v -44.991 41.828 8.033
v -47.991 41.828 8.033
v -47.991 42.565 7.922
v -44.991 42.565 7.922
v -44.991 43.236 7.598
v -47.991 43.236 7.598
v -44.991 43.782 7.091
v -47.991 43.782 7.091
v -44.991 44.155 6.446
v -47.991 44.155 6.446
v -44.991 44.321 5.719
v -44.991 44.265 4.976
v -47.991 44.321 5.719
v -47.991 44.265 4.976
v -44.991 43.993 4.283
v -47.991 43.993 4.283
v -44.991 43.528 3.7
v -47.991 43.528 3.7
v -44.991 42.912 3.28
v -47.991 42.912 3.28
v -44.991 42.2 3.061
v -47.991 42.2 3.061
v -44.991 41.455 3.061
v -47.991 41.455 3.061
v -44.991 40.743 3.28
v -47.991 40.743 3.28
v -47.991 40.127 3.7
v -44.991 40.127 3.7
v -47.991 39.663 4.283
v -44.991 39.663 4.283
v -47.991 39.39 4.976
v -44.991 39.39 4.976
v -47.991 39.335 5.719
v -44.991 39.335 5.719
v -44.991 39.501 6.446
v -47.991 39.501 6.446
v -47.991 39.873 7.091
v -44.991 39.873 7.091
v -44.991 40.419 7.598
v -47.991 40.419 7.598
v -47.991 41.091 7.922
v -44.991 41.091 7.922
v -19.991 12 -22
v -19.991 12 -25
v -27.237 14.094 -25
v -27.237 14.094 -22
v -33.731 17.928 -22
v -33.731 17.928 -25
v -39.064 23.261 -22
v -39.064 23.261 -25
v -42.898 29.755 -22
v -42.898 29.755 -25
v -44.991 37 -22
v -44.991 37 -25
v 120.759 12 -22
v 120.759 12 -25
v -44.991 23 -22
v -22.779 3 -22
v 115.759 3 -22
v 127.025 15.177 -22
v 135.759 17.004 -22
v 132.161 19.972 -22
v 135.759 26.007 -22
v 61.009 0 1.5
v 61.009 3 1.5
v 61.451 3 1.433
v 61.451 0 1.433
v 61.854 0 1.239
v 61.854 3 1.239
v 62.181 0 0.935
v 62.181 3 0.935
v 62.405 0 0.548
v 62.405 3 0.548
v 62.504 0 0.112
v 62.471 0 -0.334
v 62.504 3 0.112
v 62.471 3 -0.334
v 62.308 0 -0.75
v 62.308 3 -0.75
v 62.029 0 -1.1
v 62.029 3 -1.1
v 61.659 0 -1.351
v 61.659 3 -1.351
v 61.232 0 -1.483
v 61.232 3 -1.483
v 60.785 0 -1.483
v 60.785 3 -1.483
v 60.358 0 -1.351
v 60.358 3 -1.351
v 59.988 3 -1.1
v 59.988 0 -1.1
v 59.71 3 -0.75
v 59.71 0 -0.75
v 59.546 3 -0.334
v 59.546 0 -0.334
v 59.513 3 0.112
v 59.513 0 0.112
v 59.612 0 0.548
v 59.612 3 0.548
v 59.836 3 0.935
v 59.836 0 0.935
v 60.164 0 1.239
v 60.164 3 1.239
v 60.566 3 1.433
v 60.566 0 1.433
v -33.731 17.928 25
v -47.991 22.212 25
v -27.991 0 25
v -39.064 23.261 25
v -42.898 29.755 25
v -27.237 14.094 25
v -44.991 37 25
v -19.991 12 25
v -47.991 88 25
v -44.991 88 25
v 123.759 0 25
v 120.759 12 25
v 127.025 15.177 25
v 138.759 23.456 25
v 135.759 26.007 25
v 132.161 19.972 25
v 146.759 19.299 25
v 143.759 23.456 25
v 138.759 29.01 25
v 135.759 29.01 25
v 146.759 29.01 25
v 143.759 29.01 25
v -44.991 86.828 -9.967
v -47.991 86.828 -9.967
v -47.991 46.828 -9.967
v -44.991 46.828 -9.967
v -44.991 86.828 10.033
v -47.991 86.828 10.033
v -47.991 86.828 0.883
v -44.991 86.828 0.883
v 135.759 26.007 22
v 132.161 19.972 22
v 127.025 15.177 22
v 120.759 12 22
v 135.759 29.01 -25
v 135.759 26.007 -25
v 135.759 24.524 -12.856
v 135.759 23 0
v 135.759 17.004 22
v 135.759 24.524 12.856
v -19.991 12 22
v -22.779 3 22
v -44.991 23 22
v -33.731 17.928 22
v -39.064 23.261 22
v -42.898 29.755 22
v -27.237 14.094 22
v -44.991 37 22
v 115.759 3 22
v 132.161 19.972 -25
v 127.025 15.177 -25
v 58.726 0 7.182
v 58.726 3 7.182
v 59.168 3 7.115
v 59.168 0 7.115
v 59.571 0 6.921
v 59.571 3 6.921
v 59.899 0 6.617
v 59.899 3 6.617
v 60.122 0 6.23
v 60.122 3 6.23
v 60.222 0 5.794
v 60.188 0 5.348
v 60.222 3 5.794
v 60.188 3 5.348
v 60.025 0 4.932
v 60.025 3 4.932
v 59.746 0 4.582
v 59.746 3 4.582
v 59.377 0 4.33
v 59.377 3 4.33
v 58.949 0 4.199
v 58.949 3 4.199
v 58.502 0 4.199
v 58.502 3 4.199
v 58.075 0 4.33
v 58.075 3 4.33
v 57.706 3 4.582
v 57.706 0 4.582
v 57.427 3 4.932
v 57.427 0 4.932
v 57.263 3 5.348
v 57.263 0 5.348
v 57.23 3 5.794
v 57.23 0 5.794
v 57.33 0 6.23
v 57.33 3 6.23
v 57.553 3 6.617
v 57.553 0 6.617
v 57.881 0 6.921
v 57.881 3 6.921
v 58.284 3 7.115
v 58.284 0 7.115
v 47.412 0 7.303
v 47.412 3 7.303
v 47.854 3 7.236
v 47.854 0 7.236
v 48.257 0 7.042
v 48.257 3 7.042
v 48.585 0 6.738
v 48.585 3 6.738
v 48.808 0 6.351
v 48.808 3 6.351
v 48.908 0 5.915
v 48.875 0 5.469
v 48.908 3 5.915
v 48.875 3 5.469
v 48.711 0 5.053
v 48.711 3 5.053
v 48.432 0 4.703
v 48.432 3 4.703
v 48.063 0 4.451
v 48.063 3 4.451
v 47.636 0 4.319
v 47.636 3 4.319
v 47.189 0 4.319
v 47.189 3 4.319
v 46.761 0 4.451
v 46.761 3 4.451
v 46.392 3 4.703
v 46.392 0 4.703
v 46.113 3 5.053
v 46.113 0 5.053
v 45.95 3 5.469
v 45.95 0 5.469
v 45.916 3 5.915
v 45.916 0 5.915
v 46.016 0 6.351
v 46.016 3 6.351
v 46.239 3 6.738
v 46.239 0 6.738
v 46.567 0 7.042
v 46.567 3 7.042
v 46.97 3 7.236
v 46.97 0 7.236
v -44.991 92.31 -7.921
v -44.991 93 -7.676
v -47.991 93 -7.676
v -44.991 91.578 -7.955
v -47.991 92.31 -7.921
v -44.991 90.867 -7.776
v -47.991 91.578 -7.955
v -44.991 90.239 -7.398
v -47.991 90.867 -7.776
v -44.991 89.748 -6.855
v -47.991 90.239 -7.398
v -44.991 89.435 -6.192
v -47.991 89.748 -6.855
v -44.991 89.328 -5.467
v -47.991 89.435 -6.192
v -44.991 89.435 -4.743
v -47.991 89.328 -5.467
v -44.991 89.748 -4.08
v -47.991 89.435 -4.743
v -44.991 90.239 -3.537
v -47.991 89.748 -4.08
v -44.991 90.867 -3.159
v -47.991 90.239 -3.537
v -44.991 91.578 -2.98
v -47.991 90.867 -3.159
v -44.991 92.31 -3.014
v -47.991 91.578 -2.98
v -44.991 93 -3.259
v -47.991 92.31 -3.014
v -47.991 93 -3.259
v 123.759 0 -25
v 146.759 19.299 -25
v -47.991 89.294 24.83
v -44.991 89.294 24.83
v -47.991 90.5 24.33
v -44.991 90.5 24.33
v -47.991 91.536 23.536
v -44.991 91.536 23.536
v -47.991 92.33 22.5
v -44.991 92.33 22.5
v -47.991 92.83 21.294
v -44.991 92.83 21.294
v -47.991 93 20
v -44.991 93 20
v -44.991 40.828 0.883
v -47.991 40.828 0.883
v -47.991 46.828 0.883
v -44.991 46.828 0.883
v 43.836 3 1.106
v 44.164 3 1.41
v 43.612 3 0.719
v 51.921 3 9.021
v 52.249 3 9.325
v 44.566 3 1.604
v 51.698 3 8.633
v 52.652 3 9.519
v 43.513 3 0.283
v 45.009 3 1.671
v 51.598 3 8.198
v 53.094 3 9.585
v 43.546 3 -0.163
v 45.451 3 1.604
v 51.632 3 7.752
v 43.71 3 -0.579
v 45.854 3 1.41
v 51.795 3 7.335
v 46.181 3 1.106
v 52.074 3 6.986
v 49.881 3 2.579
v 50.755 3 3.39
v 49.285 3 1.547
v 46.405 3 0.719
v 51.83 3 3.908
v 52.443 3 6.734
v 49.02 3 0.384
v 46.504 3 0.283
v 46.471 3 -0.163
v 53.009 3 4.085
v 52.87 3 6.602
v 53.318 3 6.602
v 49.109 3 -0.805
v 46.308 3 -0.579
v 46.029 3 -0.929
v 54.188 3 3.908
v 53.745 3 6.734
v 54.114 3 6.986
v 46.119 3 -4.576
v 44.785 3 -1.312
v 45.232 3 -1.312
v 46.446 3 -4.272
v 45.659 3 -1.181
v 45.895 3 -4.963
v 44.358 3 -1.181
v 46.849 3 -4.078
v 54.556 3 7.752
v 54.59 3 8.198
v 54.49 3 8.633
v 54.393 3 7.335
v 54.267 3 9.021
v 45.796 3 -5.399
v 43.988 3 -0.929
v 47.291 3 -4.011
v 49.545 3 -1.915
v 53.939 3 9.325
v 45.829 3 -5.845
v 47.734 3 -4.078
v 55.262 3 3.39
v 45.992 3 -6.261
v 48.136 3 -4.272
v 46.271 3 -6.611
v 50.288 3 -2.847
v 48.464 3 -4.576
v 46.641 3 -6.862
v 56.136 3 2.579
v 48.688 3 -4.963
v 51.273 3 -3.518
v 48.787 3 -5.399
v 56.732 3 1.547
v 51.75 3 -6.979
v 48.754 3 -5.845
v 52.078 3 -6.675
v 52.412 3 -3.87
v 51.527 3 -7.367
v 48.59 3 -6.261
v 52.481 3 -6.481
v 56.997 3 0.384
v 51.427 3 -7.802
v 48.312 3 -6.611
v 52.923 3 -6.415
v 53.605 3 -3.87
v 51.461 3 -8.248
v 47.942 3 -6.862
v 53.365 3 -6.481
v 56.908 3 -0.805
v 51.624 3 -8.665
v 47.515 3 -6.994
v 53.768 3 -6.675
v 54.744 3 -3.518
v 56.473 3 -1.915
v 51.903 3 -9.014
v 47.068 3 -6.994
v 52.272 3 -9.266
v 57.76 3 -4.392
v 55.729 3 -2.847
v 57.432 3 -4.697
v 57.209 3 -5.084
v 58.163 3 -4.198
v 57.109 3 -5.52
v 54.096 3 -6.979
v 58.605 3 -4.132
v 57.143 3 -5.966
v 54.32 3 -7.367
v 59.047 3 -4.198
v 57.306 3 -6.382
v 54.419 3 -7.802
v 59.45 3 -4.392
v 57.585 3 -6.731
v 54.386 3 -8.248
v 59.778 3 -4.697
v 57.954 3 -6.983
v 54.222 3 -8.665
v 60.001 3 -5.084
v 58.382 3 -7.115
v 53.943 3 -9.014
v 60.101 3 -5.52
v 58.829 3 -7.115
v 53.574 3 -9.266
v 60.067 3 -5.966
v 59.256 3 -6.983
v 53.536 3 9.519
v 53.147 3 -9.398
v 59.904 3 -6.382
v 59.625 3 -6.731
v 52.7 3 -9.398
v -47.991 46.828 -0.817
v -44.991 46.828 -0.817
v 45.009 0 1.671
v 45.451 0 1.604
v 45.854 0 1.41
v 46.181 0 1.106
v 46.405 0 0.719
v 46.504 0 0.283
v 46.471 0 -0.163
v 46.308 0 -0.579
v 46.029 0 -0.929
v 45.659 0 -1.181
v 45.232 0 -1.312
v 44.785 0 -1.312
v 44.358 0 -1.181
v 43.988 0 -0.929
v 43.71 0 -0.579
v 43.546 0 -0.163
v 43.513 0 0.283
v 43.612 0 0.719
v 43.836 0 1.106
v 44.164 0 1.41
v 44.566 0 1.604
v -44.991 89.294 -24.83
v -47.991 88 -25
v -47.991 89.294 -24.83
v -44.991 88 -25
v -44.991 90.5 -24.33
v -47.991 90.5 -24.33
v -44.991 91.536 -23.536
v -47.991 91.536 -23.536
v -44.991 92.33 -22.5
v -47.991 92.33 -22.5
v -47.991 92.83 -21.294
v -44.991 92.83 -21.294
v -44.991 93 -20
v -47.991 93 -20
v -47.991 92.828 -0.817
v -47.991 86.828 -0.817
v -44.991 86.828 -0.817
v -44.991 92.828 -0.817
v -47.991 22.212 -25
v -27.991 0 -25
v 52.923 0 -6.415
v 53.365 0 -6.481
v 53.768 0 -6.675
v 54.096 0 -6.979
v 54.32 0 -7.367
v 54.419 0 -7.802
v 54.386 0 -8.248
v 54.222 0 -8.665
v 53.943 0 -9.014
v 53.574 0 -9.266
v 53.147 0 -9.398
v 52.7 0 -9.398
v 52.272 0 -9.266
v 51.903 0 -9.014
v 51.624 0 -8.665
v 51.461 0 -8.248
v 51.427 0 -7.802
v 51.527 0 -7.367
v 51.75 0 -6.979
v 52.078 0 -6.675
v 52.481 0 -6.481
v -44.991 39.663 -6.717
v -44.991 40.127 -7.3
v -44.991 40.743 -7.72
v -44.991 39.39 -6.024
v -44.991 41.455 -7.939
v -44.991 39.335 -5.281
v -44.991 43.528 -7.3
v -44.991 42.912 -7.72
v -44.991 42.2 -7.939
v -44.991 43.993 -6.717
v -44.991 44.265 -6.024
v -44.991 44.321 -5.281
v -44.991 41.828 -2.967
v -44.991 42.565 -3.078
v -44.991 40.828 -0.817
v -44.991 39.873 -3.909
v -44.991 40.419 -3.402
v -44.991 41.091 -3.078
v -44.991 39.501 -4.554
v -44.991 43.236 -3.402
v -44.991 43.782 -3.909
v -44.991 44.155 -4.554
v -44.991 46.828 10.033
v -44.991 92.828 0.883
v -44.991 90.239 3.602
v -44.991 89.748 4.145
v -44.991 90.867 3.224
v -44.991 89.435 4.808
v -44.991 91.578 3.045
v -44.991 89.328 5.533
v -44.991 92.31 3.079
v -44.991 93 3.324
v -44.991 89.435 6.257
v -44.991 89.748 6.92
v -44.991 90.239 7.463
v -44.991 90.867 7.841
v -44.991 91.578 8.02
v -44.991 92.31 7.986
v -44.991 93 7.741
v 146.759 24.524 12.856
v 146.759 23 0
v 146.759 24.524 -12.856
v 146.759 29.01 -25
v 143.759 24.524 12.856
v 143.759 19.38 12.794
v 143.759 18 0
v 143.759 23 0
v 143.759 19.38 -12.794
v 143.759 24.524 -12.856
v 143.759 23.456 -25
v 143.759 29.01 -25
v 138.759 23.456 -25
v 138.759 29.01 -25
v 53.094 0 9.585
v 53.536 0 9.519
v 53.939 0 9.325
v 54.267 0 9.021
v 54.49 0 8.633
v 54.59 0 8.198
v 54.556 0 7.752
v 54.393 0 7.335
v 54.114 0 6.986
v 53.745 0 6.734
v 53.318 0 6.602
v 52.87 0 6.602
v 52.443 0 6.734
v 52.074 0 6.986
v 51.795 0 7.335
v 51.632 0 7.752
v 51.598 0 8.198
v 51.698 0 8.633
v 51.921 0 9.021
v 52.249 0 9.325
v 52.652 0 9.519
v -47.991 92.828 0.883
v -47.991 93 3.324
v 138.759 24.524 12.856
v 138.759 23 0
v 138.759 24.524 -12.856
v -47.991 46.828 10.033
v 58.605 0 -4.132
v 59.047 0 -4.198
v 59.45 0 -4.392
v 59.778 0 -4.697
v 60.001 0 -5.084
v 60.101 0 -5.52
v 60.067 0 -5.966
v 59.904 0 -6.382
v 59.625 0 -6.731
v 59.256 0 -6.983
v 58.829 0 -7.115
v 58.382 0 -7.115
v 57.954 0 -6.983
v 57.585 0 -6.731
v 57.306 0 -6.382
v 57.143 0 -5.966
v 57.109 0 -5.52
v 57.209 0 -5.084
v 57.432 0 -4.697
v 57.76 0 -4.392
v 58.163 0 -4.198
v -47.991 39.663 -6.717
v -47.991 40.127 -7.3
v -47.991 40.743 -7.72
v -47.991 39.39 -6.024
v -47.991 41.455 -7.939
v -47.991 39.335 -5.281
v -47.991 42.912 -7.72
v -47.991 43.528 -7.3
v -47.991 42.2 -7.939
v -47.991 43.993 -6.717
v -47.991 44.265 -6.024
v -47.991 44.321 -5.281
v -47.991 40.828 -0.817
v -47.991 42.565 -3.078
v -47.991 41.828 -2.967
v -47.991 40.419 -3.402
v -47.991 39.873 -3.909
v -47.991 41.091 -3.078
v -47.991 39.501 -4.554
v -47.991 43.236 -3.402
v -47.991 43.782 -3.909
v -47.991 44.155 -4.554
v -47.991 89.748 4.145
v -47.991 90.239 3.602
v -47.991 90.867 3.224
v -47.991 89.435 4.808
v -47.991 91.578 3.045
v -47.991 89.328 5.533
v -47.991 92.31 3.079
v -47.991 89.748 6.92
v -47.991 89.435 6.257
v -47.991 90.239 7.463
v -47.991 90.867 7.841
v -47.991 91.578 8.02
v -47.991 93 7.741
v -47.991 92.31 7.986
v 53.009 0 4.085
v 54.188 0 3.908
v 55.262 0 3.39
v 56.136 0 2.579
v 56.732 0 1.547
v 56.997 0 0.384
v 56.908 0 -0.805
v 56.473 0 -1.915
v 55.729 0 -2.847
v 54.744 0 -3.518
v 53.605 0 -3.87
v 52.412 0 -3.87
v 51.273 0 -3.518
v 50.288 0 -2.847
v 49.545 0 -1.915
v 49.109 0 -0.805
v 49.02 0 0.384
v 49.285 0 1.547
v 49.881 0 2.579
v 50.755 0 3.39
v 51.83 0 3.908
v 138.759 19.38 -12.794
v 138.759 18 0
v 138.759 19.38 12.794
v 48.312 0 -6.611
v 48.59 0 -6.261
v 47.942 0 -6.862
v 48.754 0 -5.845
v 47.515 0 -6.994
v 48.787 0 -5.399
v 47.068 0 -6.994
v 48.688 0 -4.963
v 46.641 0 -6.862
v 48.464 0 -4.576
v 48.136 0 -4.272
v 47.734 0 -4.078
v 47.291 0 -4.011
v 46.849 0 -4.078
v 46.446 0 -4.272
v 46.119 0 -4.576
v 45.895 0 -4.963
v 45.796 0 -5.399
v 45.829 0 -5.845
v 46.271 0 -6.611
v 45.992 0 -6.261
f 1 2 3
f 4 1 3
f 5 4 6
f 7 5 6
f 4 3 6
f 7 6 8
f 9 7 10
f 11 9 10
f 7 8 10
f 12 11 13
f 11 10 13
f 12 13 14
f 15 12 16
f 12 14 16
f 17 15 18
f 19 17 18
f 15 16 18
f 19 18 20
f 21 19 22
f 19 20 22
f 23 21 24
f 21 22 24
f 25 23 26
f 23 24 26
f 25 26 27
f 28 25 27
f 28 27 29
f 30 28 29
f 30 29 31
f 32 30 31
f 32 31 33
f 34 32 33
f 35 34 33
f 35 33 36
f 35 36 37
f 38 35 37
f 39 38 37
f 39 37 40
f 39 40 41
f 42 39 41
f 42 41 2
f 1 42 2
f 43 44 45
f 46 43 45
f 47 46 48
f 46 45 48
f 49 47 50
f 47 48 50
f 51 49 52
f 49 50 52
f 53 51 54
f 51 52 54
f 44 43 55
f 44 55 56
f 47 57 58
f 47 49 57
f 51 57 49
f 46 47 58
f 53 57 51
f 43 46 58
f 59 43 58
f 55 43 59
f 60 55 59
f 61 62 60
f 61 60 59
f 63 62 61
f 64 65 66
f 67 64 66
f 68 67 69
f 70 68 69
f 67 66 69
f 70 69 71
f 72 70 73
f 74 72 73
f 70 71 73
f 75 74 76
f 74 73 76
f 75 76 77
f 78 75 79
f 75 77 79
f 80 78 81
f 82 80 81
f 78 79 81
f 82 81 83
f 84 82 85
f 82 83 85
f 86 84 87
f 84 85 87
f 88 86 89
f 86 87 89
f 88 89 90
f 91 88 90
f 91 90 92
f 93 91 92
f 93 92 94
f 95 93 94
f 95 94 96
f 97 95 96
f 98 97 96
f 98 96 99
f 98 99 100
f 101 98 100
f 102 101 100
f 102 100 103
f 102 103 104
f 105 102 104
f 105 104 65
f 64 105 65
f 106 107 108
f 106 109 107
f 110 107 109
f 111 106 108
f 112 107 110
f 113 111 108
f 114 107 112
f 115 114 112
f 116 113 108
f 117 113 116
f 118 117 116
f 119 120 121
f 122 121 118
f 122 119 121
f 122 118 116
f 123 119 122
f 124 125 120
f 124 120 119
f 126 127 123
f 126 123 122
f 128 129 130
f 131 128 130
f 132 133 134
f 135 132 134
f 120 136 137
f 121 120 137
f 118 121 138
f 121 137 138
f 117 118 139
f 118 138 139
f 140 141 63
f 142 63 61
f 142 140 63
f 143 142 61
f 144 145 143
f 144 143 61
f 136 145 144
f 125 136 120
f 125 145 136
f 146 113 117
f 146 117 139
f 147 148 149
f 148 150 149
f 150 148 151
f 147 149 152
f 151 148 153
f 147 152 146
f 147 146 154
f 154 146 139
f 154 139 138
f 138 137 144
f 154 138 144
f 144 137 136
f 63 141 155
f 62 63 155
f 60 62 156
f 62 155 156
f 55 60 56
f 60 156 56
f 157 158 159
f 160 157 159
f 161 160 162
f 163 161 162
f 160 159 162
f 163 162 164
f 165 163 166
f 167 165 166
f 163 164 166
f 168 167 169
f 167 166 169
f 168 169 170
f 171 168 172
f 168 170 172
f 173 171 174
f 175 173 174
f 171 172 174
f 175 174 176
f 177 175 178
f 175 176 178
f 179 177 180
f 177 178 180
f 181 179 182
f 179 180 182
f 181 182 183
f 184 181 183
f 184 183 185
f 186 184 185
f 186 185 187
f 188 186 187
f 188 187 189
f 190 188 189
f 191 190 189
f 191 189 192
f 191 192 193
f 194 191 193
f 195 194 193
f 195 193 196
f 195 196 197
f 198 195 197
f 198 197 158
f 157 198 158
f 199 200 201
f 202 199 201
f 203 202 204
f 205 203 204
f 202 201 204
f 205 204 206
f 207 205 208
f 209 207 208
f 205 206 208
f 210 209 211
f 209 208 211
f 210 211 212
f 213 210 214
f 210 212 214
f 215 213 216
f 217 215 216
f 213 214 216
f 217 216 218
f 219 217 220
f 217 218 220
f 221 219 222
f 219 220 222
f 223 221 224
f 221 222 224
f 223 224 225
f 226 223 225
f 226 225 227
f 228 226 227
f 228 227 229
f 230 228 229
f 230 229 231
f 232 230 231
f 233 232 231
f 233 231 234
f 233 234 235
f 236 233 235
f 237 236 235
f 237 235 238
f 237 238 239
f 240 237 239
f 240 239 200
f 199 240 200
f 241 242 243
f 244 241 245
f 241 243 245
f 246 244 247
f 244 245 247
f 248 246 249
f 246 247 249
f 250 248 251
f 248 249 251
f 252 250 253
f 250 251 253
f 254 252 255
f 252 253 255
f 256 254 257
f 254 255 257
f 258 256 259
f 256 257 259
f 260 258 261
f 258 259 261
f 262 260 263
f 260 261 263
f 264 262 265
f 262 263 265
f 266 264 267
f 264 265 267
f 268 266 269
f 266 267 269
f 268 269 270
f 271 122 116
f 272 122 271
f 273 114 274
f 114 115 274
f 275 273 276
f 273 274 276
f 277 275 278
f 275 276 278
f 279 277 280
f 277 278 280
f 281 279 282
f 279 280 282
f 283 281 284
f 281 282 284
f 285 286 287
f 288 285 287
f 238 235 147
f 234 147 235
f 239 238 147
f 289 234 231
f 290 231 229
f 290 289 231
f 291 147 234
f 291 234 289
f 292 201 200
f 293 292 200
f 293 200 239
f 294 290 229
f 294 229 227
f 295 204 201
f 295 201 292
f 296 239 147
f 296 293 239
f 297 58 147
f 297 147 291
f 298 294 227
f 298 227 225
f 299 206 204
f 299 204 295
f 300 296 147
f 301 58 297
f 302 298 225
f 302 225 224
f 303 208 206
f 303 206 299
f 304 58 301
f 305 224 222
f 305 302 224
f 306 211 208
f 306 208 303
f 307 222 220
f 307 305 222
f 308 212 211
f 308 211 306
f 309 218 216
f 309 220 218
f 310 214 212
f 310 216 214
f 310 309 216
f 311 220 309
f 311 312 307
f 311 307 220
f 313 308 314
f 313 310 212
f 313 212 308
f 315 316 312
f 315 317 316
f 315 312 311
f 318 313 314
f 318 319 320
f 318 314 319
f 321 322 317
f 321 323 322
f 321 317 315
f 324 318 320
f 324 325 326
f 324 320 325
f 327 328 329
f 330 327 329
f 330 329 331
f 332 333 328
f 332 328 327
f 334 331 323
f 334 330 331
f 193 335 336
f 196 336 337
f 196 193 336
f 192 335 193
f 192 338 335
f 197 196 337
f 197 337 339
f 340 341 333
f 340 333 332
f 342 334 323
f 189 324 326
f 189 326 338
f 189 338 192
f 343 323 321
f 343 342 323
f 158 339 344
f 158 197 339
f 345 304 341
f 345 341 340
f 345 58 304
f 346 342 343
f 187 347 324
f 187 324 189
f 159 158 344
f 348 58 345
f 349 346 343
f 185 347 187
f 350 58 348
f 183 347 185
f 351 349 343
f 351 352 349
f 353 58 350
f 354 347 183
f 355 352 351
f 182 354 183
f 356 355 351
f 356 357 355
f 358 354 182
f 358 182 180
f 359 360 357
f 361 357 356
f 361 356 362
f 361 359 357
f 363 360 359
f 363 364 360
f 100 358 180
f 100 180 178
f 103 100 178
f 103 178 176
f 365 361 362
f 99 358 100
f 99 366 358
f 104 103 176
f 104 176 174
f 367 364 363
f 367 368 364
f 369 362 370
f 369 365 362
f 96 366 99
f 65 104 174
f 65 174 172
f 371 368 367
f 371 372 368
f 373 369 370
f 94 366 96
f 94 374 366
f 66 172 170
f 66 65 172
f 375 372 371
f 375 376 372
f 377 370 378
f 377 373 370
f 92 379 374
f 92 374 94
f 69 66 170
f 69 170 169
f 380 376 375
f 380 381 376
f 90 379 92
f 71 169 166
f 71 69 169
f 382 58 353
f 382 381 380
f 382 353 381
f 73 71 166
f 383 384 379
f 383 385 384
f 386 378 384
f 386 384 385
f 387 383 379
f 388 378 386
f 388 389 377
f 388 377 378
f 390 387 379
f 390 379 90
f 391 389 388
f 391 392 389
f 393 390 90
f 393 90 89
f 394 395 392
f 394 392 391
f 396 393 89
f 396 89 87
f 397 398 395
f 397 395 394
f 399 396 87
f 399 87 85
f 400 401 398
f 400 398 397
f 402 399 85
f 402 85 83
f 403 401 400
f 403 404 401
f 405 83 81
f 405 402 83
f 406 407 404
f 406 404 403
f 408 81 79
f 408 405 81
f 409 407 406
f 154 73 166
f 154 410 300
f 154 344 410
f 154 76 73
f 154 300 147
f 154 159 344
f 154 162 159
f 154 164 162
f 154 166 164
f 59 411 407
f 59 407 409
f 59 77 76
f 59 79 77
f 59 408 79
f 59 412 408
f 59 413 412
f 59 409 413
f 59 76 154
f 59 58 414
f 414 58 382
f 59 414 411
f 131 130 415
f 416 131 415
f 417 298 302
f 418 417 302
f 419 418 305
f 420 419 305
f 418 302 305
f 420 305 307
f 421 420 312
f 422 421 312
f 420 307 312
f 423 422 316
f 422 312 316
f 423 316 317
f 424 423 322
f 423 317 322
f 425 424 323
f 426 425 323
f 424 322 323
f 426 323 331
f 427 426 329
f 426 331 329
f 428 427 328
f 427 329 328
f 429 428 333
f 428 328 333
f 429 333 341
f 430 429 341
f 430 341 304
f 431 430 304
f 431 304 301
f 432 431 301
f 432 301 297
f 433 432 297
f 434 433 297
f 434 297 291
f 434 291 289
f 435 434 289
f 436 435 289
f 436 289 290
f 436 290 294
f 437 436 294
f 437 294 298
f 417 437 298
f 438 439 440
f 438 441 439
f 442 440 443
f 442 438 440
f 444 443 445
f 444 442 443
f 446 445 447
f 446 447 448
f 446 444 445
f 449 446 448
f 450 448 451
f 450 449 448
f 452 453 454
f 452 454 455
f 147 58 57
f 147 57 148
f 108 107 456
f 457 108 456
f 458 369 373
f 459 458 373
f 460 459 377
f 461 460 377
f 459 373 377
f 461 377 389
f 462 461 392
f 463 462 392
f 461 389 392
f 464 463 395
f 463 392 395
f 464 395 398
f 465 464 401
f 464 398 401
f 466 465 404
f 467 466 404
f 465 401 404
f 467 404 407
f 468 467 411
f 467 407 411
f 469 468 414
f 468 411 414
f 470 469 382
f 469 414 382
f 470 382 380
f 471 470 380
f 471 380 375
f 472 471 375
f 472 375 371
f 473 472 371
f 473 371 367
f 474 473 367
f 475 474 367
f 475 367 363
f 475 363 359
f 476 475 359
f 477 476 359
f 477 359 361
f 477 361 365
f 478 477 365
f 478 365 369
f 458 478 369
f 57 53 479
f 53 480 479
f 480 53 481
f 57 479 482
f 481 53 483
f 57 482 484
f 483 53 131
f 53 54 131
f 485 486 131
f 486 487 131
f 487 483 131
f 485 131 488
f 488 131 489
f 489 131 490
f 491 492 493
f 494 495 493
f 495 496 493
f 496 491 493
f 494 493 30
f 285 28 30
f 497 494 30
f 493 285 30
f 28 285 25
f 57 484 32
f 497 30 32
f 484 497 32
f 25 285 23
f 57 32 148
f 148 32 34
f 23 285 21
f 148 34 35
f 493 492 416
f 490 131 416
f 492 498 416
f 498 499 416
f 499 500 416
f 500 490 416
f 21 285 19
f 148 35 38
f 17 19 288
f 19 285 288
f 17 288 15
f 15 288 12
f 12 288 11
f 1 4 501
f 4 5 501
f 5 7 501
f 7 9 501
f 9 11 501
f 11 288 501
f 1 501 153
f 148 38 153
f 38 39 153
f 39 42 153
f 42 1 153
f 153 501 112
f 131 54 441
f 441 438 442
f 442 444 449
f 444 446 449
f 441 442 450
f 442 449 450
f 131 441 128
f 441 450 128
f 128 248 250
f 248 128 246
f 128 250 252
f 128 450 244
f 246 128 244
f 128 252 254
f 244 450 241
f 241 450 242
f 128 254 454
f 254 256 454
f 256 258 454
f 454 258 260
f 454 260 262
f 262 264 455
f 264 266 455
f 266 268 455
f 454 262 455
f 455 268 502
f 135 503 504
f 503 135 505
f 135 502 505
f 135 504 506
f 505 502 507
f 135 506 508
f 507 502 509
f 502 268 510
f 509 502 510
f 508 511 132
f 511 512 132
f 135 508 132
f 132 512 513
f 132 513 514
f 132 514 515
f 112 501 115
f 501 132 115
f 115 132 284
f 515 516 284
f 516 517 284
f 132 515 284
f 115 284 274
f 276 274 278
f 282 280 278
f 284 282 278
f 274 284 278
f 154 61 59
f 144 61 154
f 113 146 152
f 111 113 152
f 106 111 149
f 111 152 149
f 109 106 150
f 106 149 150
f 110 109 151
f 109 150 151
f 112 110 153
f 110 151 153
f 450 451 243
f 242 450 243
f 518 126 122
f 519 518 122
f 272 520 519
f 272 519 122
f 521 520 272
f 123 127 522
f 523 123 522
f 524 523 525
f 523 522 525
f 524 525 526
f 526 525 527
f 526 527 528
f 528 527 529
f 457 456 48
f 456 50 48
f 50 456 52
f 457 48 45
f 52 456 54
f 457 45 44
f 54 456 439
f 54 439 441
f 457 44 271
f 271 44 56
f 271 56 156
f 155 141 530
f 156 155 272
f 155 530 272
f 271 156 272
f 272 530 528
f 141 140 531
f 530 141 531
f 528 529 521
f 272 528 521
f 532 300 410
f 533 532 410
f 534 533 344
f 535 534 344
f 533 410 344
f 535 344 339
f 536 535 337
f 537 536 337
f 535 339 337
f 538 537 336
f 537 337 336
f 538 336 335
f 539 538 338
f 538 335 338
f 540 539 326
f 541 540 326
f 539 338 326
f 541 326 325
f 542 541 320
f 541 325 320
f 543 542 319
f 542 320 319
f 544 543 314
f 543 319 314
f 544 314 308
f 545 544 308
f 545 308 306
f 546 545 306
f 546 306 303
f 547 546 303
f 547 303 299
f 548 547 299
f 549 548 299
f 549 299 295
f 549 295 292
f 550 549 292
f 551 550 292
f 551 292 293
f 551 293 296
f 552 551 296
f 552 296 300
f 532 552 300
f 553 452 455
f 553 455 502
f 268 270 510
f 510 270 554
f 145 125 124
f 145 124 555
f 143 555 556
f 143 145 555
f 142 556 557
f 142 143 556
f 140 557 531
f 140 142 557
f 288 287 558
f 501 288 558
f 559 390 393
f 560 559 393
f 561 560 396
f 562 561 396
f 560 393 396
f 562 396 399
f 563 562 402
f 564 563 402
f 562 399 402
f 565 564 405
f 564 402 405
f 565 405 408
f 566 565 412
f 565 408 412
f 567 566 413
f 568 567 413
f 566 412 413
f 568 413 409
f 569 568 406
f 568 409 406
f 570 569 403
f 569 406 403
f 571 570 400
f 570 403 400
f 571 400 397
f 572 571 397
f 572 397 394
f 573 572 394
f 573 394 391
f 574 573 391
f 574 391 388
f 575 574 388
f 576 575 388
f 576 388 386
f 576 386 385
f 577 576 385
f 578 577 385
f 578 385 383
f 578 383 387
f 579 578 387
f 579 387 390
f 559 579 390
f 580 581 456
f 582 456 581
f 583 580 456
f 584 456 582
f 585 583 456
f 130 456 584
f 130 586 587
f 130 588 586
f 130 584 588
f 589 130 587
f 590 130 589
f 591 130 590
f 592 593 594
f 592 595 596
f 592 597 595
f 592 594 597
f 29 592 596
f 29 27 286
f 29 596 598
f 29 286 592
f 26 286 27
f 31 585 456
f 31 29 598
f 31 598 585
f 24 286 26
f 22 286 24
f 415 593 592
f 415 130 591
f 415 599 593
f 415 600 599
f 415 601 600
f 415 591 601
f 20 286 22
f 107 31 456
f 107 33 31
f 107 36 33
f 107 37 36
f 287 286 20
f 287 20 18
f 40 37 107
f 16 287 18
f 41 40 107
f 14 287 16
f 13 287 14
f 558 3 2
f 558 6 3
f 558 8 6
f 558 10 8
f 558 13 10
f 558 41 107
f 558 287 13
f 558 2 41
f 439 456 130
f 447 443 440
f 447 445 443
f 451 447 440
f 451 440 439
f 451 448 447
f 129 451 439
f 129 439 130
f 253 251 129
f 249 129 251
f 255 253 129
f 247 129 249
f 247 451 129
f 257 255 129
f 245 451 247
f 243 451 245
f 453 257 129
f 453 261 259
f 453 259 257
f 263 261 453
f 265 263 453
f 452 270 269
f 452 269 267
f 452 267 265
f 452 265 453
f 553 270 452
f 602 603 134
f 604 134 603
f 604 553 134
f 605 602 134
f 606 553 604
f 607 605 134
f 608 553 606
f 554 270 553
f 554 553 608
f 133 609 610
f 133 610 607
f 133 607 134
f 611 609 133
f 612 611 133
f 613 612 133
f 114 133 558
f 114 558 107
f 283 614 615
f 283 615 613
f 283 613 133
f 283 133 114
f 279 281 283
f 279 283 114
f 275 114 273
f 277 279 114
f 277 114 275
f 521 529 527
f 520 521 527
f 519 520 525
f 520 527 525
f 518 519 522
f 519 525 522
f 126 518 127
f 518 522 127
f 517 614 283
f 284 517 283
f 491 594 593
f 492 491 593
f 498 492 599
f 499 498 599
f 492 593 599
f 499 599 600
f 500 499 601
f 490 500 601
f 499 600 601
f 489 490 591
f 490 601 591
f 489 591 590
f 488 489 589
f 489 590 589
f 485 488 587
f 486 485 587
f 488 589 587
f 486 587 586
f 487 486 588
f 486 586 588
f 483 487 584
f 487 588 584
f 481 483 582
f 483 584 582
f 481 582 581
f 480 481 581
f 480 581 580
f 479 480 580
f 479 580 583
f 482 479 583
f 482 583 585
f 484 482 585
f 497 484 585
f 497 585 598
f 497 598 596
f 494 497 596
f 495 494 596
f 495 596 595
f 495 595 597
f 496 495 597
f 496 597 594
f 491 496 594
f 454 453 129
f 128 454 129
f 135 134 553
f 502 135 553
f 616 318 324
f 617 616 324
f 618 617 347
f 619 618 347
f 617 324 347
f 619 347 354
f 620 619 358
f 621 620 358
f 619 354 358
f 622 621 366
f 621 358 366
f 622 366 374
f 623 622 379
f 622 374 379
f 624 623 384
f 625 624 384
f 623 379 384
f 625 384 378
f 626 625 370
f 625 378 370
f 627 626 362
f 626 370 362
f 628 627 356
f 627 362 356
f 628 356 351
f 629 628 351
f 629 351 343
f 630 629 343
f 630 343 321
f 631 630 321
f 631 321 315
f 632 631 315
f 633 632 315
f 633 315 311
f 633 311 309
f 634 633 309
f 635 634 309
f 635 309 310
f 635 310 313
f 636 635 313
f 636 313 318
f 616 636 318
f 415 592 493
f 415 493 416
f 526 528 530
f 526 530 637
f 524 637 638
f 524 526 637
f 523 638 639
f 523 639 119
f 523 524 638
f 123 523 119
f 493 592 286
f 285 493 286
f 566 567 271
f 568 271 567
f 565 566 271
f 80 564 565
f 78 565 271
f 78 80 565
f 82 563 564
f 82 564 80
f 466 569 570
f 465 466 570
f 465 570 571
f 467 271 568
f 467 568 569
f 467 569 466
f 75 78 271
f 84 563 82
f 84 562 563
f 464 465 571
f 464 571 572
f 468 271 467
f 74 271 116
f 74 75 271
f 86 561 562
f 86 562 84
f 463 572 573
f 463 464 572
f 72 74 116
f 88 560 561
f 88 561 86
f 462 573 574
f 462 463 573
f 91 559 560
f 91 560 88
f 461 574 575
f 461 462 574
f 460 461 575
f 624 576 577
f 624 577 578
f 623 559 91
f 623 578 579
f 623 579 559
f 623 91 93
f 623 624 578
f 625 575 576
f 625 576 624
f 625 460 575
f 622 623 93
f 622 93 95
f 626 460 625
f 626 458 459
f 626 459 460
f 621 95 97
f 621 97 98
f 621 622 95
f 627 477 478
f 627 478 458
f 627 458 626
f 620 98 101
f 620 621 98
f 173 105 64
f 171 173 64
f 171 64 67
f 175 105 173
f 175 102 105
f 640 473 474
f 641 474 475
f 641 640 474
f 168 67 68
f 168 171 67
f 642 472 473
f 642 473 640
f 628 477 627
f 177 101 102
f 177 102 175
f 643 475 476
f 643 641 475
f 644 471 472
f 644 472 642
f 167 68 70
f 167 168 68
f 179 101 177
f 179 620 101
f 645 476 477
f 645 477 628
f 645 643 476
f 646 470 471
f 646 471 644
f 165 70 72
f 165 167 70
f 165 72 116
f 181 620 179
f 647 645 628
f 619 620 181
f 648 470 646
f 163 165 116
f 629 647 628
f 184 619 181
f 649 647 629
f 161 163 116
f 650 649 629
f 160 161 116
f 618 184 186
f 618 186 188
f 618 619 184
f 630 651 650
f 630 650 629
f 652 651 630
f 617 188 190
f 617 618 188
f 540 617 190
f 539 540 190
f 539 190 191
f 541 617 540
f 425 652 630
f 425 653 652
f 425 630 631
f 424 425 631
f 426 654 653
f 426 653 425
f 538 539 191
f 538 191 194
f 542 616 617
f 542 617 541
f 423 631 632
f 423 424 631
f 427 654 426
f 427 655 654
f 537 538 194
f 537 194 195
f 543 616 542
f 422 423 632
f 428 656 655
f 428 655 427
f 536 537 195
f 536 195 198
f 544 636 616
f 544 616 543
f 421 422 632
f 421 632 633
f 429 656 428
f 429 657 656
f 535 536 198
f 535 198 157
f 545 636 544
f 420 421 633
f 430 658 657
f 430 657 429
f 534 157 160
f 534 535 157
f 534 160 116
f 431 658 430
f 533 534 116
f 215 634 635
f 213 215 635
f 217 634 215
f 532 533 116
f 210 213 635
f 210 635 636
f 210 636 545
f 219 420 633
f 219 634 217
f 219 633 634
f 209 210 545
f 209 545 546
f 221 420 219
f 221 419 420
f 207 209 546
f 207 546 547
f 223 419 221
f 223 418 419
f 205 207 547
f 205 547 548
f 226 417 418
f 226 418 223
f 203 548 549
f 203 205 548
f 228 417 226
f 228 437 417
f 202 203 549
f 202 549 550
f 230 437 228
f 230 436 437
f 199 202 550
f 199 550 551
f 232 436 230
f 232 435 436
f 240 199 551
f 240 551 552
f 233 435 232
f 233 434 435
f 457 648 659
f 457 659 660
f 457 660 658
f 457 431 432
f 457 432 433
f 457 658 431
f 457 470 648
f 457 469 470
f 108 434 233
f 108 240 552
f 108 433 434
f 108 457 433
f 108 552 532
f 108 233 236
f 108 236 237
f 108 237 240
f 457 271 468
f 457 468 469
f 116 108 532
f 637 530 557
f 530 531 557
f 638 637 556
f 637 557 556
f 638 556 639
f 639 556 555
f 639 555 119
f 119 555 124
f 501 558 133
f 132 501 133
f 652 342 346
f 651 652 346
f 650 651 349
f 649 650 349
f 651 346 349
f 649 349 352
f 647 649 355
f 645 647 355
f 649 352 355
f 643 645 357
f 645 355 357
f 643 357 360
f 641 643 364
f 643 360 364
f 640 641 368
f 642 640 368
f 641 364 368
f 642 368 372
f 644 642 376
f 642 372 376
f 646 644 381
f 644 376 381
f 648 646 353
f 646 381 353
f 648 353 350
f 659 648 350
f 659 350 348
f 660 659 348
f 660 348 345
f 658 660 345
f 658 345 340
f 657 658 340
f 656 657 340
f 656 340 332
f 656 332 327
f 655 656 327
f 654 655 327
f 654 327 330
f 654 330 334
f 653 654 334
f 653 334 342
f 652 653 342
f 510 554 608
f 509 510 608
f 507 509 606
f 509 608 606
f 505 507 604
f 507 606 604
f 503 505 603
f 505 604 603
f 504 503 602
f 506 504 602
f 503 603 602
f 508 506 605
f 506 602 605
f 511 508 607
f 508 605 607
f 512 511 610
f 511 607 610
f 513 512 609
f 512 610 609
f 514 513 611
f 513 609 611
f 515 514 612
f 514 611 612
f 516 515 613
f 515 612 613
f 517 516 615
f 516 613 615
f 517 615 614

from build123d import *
from OCP.BRepFilletAPI import BRepFilletAPI_MakeChamfer

# Parameters (mm, degrees)
SKETCH1_W           = 194.75
SKETCH1_H           = 50
BOSS_EXTRUDE1_DEPTH = 3
BOSS_EXTRUDE2_START = -3
BOSS_EXTRUDE2_DEPTH = 5
BOSS_EXTRUDE3_DEPTH = 3
BOSS_EXTRUDE4_START = -3
BOSS_EXTRUDE4_DEPTH = 3
SKETCH6_W           = 50
SKETCH6_H           = 90
BOSS_EXTRUDE5_DEPTH = 3
BOSS_EXTRUDE6_REACH = 216.574
SKETCH7_W           = 3
SKETCH7_H           = 9
RIB1_START          = -3
RIB1_DEPTH          = 3
LPATTERN1_COUNT     = 2
LPATTERN1_PITCH     = 47
RIB2_START          = -3
RIB2_DEPTH          = 3
LPATTERN2_COUNT     = 2
LPATTERN2_PITCH     = 47
CUT_EXTRUDE1_REACH  = 175.963
SKETCH10_R          = 4
SKETCH10_R_2        = 1.5
FILLET1_R           = 5
CHAMFER1_SIZE       = 20
CHAMFER1_SIZE2      = 22.212250297
CHAMFER2_SIZE       = 20
CHAMFER2_SIZE2      = 14.004150764
CHAMFER3_SIZE       = 23
CHAMFER3_SIZE2      = 19.299291517
CUT_EXTRUDE2_REACH  = 219.259
SKETCH11_W          = 1.7
SKETCH11_H          = 6
SKETCH11_R          = 2.5


# Read off the part's stored shape, not the designer's step: Rib1, Rib2
with BuildPart() as part:
    # Sketch1 → Boss-Extrude1 (new body)
    with BuildSketch(Plane(origin=(0, 0, 0), x_dir=(1, 0, 0), z_dir=(0, 1, 0))):
        with Locations((49.3836315, 0)):
            Rectangle(SKETCH1_W, SKETCH1_H)
    extrude(amount=BOSS_EXTRUDE1_DEPTH)

    # Sketch2 → Boss-Extrude2 (add)
    with BuildSketch(Plane(origin=(146.7586315, 0, 0), x_dir=(0, 0, -1), z_dir=(1, 0, 0)).offset(BOSS_EXTRUDE2_START)):
        with BuildLine():
            Line((25, 3), (25, 23.456439427))
            ThreePointArc((25, 23.456439427), (0, 18), (-25, 23.456439427))
            Line((-25, 23.456439427), (-25, 3))
            Line((-25, 3), (25, 3))
        make_face()
    extrude(amount=-BOSS_EXTRUDE2_DEPTH)

    # Sketch3 → Boss-Extrude3 (add)
    with BuildSketch(Plane(origin=(143.7586315, 0, 0), x_dir=(0, 0, -1), z_dir=(1, 0, 0))):
        with BuildLine():
            Line((-25, 3), (25, 3))
            Line((25, 3), (25, 29.010205144))
            ThreePointArc((25, 29.010205144), (0, 23), (-25, 29.010205144))
            Line((-25, 29.010205144), (-25, 3))
        make_face()
    extrude(amount=BOSS_EXTRUDE3_DEPTH)

    # Sketch4 → Boss-Extrude4 (add)
    with BuildSketch(Plane(origin=(138.7586315, 0, 0), x_dir=(0, 0, -1), z_dir=(1, 0, 0)).offset(BOSS_EXTRUDE4_START)):
        with BuildLine():
            Line((-25, 0), (-25, 29.010205144))
            ThreePointArc((-25, 29.010205144), (0, 23), (25, 29.010205144))
            Line((25, 29.010205144), (25, 0))
            Line((25, 0), (-25, 0))
        make_face()
    extrude(amount=BOSS_EXTRUDE4_DEPTH)

    # Sketch6 → Boss-Extrude5 (add)
    with BuildSketch(Plane.ZY.offset(47.9913685)):
        with Locations((0, 48)):
            Rectangle(SKETCH6_W, SKETCH6_H)
    extrude(amount=-BOSS_EXTRUDE5_DEPTH)

    # Sketch7 → Boss-Extrude6 (add, up to next)
    with BuildSketch(Plane(origin=(-44.9913685, 0, 0), x_dir=(0, 0, -1), z_dir=(1, 0, 0)), mode=Mode.PRIVATE) as boss_extrude6_sk1:
        with Locations((-23.5, 7.5)):
            Rectangle(SKETCH7_W, SKETCH7_H)
    boss_extrude6_tool1 = extrude(boss_extrude6_sk1.sketch, amount=BOSS_EXTRUDE6_REACH, mode=Mode.PRIVATE) - part.part
    # Sketch7 → Boss-Extrude6 (add, up to next)
    with BuildSketch(Plane(origin=(-44.9913685, 0, 0), x_dir=(0, 0, -1), z_dir=(1, 0, 0)), mode=Mode.PRIVATE) as boss_extrude6_sk2:
        with Locations((23.5, 7.5)):
            Rectangle(SKETCH7_W, SKETCH7_H)
    boss_extrude6_tool2 = extrude(boss_extrude6_sk2.sketch, amount=BOSS_EXTRUDE6_REACH, mode=Mode.PRIVATE) - part.part
    add(boss_extrude6_tool1.solids().sort_by_distance((-44.991369, 7.5, 23.5))[0])
    add(boss_extrude6_tool2.solids().sort_by_distance((-44.991369, 7.5, -23.5))[0])

    # Rib1 outline → Rib1 (add)
    with BuildSketch(Plane.XY.offset(25).offset(RIB1_START)):
        with BuildLine():
            ThreePointArc((-19.991368497, 11.999999999), (-36.565435434, 20.425933064), (-44.9913685, 37))
            Line((-44.9913685, 37), (-44.9913685, 12))
            Line((-44.9913685, 12), (-19.991368497, 11.999999999))
        make_face()
    rib1 = extrude(amount=RIB1_DEPTH)

    # LPattern1: Rib1 ×2
    with Locations(*[(0, 0, -i * LPATTERN1_PITCH) for i in range(1, LPATTERN1_COUNT)]):
        add(rib1)

    # Rib2 outline → Rib2 (add)
    with BuildSketch(Plane.XY.offset(25).offset(RIB2_START)):
        with BuildLine():
            ThreePointArc((135.7586315, 26.007069295), (129.762224626, 17.393355072), (120.7586315, 12))
            Line((120.7586315, 12), (135.7586315, 12))
            Line((135.7586315, 12), (135.7586315, 26.007069295))
        make_face()
    rib2 = extrude(amount=RIB2_DEPTH)

    # LPattern2: Rib2 ×2
    with Locations(*[(0, 0, -i * LPATTERN2_PITCH) for i in range(1, LPATTERN2_COUNT)]):
        add(rib2)

    # Sketch10 → Cut-Extrude1 (cut, up to next)
    with BuildSketch(Plane(origin=(0, 3, 0), x_dir=(1, 0, 0), z_dir=(0, 1, 0)), mode=Mode.PRIVATE) as cut_extrude1_sk1:
        with Locations(Location((53.0086315, -0.085435095, 0), (0, 0, 270))):
            Circle(SKETCH10_R)
    cut_extrude1_tool1 = extrude(cut_extrude1_sk1.sketch, amount=-CUT_EXTRUDE1_REACH, mode=Mode.PRIVATE) & part.part
    # Sketch10 → Cut-Extrude1 (cut, up to next)
    with BuildSketch(Plane(origin=(0, 3, 0), x_dir=(1, 0, 0), z_dir=(0, 1, 0)), mode=Mode.PRIVATE) as cut_extrude1_sk2:
        with Locations(Location((61.0086315, -2.1452e-05, 0), (0, 0, 270))):
            Circle(SKETCH10_R_2)
    cut_extrude1_tool2 = extrude(cut_extrude1_sk2.sketch, amount=-CUT_EXTRUDE1_REACH, mode=Mode.PRIVATE) & part.part
    # Sketch10 → Cut-Extrude1 (cut, up to next)
    with BuildSketch(Plane(origin=(0, 3, 0), x_dir=(1, 0, 0), z_dir=(0, 1, 0)), mode=Mode.PRIVATE) as cut_extrude1_sk3:
        with Locations(Location((58.725882315, -5.681892778, 0), (0, 0, 270))):
            Circle(SKETCH10_R_2)
    cut_extrude1_tool3 = extrude(cut_extrude1_sk3.sketch, amount=-CUT_EXTRUDE1_REACH, mode=Mode.PRIVATE) & part.part
    # Sketch10 → Cut-Extrude1 (cut, up to next)
    with BuildSketch(Plane(origin=(0, 3, 0), x_dir=(1, 0, 0), z_dir=(0, 1, 0)), mode=Mode.PRIVATE) as cut_extrude1_sk4:
        with Locations(Location((53.094045142, -8.085435095, 0), (0, 0, 270))):
            Circle(SKETCH10_R_2)
    cut_extrude1_tool4 = extrude(cut_extrude1_sk4.sketch, amount=-CUT_EXTRUDE1_REACH, mode=Mode.PRIVATE) & part.part
    # Sketch10 → Cut-Extrude1 (cut, up to next)
    with BuildSketch(Plane(origin=(0, 3, 0), x_dir=(1, 0, 0), z_dir=(0, 1, 0)), mode=Mode.PRIVATE) as cut_extrude1_sk5:
        with Locations(Location((47.412173816, -5.80268591, 0), (0, 0, 270))):
            Circle(SKETCH10_R_2)
    cut_extrude1_tool5 = extrude(cut_extrude1_sk5.sketch, amount=-CUT_EXTRUDE1_REACH, mode=Mode.PRIVATE) & part.part
    # Sketch10 → Cut-Extrude1 (cut, up to next)
    with BuildSketch(Plane(origin=(0, 3, 0), x_dir=(1, 0, 0), z_dir=(0, 1, 0)), mode=Mode.PRIVATE) as cut_extrude1_sk6:
        with Locations(Location((45.0086315, -0.170848737, 0), (0, 0, 270))):
            Circle(SKETCH10_R_2)
    cut_extrude1_tool6 = extrude(cut_extrude1_sk6.sketch, amount=-CUT_EXTRUDE1_REACH, mode=Mode.PRIVATE) & part.part
    # Sketch10 → Cut-Extrude1 (cut, up to next)
    with BuildSketch(Plane(origin=(0, 3, 0), x_dir=(1, 0, 0), z_dir=(0, 1, 0)), mode=Mode.PRIVATE) as cut_extrude1_sk7:
        with Locations(Location((47.291380684, 5.511022589, 0), (0, 0, 270))):
            Circle(SKETCH10_R_2)
    cut_extrude1_tool7 = extrude(cut_extrude1_sk7.sketch, amount=-CUT_EXTRUDE1_REACH, mode=Mode.PRIVATE) & part.part
    # Sketch10 → Cut-Extrude1 (cut, up to next)
    with BuildSketch(Plane(origin=(0, 3, 0), x_dir=(1, 0, 0), z_dir=(0, 1, 0)), mode=Mode.PRIVATE) as cut_extrude1_sk8:
        with Locations(Location((52.923217857, 7.914564905, 0), (0, 0, 270))):
            Circle(SKETCH10_R_2)
    cut_extrude1_tool8 = extrude(cut_extrude1_sk8.sketch, amount=-CUT_EXTRUDE1_REACH, mode=Mode.PRIVATE) & part.part
    # Sketch10 → Cut-Extrude1 (cut, up to next)
    with BuildSketch(Plane(origin=(0, 3, 0), x_dir=(1, 0, 0), z_dir=(0, 1, 0)), mode=Mode.PRIVATE) as cut_extrude1_sk9:
        with Locations(Location((58.605089183, 5.631815721, 0), (0, 0, 270))):
            Circle(SKETCH10_R_2)
    cut_extrude1_tool9 = extrude(cut_extrude1_sk9.sketch, amount=-CUT_EXTRUDE1_REACH, mode=Mode.PRIVATE) & part.part
    add(cut_extrude1_tool1.solids().sort_by_distance((53.008631, 3, 0.085435))[0], mode=Mode.SUBTRACT)
    add(cut_extrude1_tool2.solids().sort_by_distance((61.008631, 3, 2.1e-05))[0], mode=Mode.SUBTRACT)
    add(cut_extrude1_tool3.solids().sort_by_distance((58.725882, 3, 5.681893))[0], mode=Mode.SUBTRACT)
    add(cut_extrude1_tool4.solids().sort_by_distance((53.094045, 3, 8.085435))[0], mode=Mode.SUBTRACT)
    add(cut_extrude1_tool5.solids().sort_by_distance((47.412174, 3, 5.802686))[0], mode=Mode.SUBTRACT)
    add(cut_extrude1_tool6.solids().sort_by_distance((45.008631, 3, 0.170849))[0], mode=Mode.SUBTRACT)
    add(cut_extrude1_tool7.solids().sort_by_distance((47.291381, 3, -5.511023))[0], mode=Mode.SUBTRACT)
    add(cut_extrude1_tool8.solids().sort_by_distance((52.923218, 3, -7.914565))[0], mode=Mode.SUBTRACT)
    add(cut_extrude1_tool9.solids().sort_by_distance((58.605089, 3, -5.631816))[0], mode=Mode.SUBTRACT)

    # Fillet1
    fillet1_edges = [part.edges().sort_by_distance(p)[0] for p in [
        (-46.4913685, 93, 25),
        (-46.4913685, 93, -25),
    ]]
    fillet(fillet1_edges, radius=FILLET1_R)

    # Chamfer1: one chamfer whose edges measure the first distance from different faces: ONE call of the kernel's chamfer builder (chamfer() names one face for all edges)
    chamfer1_edges_1 = [part.edges().sort_by_distance(p)[0] for p in [
        (-47.9913685, 0, 0),
    ]]
    chamfer1_side_1 = [part.faces().sort_by_distance(p)[0] for p in [
        (-45.98070785, 0, 0),
    ]]
    chamfer1_edges_2 = [part.edges().sort_by_distance(p)[0] for p in [
        (-44.9913685, 3, 0),
    ]]
    chamfer1_side_2 = [part.faces().sort_by_distance(p)[0] for p in [
        (-44.9913685, 49.22305707, 0),
    ]]
    chamfer1 = BRepFilletAPI_MakeChamfer(part.part.solid().wrapped)
    for e in chamfer1_edges_1:
        chamfer1.Add(CHAMFER1_SIZE, CHAMFER1_SIZE2, e.wrapped, chamfer1_side_1[0].wrapped)  # the first distance lies on this face
    for e in chamfer1_edges_2:
        chamfer1.Add(CHAMFER1_SIZE, CHAMFER1_SIZE2, e.wrapped, chamfer1_side_2[0].wrapped)  # the first distance lies on this face
    add(Compound.cast(chamfer1.Shape()), mode=Mode.REPLACE)

    # Chamfer2
    chamfer2_edges = [part.edges().sort_by_distance(p)[0] for p in [
        (135.7586315, 3, 0),
    ]]
    chamfer2_side = [part.faces().sort_by_distance(p)[0] for p in [
        (56.489756648, 3, -20.354697047),
    ]]
    chamfer(chamfer2_edges, length=CHAMFER2_SIZE, length2=CHAMFER2_SIZE2, reference=chamfer2_side[0])

    # Chamfer3
    chamfer3_edges = [part.edges().sort_by_distance(p)[0] for p in [
        (146.7586315, 0, 0),
    ]]
    chamfer3_side = [part.faces().sort_by_distance(p)[0] for p in [
        (59.462529077, 0, -0.001057352),
    ]]
    chamfer(chamfer3_edges, length=CHAMFER3_SIZE, length2=CHAMFER3_SIZE2, reference=chamfer3_side[0])

    # Sketch11 → Cut-Extrude2 (cut, up to next)
    with BuildSketch(Plane.ZY.offset(47.9913685), mode=Mode.PRIVATE) as cut_extrude2_sk1:
        with Locations((0.032606221, 89.827764741)):
            Rectangle(SKETCH11_W, SKETCH11_H)
    cut_extrude2_tool1 = extrude(cut_extrude2_sk1.sketch, amount=-CUT_EXTRUDE2_REACH, mode=Mode.PRIVATE) & part.part
    # Sketch11 → Cut-Extrude2 (cut, up to next)
    with BuildSketch(Plane.ZY.offset(47.9913685), mode=Mode.PRIVATE) as cut_extrude2_sk2:
        Polygon((0.882606221, 86.827764741), (-0.817393779, 86.827764741), (-9.967393779, 86.827764741), (-9.967393779, 46.827764741), (-0.817393779, 46.827764741), (0.882606221, 46.827764741), (10.032606221, 46.827764741), (10.032606221, 86.827764741), align=None)
    cut_extrude2_tool2 = extrude(cut_extrude2_sk2.sketch, amount=-CUT_EXTRUDE2_REACH, mode=Mode.PRIVATE) & part.part
    # Sketch11 → Cut-Extrude2 (cut, up to next)
    with BuildSketch(Plane.ZY.offset(47.9913685), mode=Mode.PRIVATE) as cut_extrude2_sk3:
        with Locations((-5.467393779, 91.827764741)):
            Circle(SKETCH11_R)
    cut_extrude2_tool3 = extrude(cut_extrude2_sk3.sketch, amount=-CUT_EXTRUDE2_REACH, mode=Mode.PRIVATE) & part.part
    # Sketch11 → Cut-Extrude2 (cut, up to next)
    with BuildSketch(Plane.ZY.offset(47.9913685), mode=Mode.PRIVATE) as cut_extrude2_sk4:
        with Locations((5.532606221, 91.827764741)):
            Circle(SKETCH11_R)
    cut_extrude2_tool4 = extrude(cut_extrude2_sk4.sketch, amount=-CUT_EXTRUDE2_REACH, mode=Mode.PRIVATE) & part.part
    # Sketch11 → Cut-Extrude2 (cut, up to next)
    with BuildSketch(Plane.ZY.offset(47.9913685), mode=Mode.PRIVATE) as cut_extrude2_sk5:
        with Locations((0.032606221, 43.827764741)):
            Rectangle(SKETCH11_W, SKETCH11_H)
    cut_extrude2_tool5 = extrude(cut_extrude2_sk5.sketch, amount=-CUT_EXTRUDE2_REACH, mode=Mode.PRIVATE) & part.part
    # Sketch11 → Cut-Extrude2 (cut, up to next)
    with BuildSketch(Plane.ZY.offset(47.9913685), mode=Mode.PRIVATE) as cut_extrude2_sk6:
        with Locations((-5.467393779, 41.827764741)):
            Circle(SKETCH11_R)
    cut_extrude2_tool6 = extrude(cut_extrude2_sk6.sketch, amount=-CUT_EXTRUDE2_REACH, mode=Mode.PRIVATE) & part.part
    # Sketch11 → Cut-Extrude2 (cut, up to next)
    with BuildSketch(Plane.ZY.offset(47.9913685), mode=Mode.PRIVATE) as cut_extrude2_sk7:
        with Locations((5.532606221, 41.827764741)):
            Circle(SKETCH11_R)
    cut_extrude2_tool7 = extrude(cut_extrude2_sk7.sketch, amount=-CUT_EXTRUDE2_REACH, mode=Mode.PRIVATE) & part.part
    add(cut_extrude2_tool1.solids().sort_by_distance((-47.991369, 89.827765, 0.032606))[0], mode=Mode.SUBTRACT)
    add(cut_extrude2_tool2.solids().sort_by_distance((-47.991369, 66.827765, 0.032606))[0], mode=Mode.SUBTRACT)
    add(cut_extrude2_tool3.solids().sort_by_distance((-47.991369, 91.827765, -5.467394))[0], mode=Mode.SUBTRACT)
    add(cut_extrude2_tool4.solids().sort_by_distance((-47.991369, 91.827765, 5.532606))[0], mode=Mode.SUBTRACT)
    add(cut_extrude2_tool5.solids().sort_by_distance((-47.991369, 43.827765, 0.032606))[0], mode=Mode.SUBTRACT)
    add(cut_extrude2_tool6.solids().sort_by_distance((-47.991369, 41.827765, -5.467394))[0], mode=Mode.SUBTRACT)
    add(cut_extrude2_tool7.solids().sort_by_distance((-47.991369, 41.827765, 5.532606))[0], mode=Mode.SUBTRACT)


solid = part.part
